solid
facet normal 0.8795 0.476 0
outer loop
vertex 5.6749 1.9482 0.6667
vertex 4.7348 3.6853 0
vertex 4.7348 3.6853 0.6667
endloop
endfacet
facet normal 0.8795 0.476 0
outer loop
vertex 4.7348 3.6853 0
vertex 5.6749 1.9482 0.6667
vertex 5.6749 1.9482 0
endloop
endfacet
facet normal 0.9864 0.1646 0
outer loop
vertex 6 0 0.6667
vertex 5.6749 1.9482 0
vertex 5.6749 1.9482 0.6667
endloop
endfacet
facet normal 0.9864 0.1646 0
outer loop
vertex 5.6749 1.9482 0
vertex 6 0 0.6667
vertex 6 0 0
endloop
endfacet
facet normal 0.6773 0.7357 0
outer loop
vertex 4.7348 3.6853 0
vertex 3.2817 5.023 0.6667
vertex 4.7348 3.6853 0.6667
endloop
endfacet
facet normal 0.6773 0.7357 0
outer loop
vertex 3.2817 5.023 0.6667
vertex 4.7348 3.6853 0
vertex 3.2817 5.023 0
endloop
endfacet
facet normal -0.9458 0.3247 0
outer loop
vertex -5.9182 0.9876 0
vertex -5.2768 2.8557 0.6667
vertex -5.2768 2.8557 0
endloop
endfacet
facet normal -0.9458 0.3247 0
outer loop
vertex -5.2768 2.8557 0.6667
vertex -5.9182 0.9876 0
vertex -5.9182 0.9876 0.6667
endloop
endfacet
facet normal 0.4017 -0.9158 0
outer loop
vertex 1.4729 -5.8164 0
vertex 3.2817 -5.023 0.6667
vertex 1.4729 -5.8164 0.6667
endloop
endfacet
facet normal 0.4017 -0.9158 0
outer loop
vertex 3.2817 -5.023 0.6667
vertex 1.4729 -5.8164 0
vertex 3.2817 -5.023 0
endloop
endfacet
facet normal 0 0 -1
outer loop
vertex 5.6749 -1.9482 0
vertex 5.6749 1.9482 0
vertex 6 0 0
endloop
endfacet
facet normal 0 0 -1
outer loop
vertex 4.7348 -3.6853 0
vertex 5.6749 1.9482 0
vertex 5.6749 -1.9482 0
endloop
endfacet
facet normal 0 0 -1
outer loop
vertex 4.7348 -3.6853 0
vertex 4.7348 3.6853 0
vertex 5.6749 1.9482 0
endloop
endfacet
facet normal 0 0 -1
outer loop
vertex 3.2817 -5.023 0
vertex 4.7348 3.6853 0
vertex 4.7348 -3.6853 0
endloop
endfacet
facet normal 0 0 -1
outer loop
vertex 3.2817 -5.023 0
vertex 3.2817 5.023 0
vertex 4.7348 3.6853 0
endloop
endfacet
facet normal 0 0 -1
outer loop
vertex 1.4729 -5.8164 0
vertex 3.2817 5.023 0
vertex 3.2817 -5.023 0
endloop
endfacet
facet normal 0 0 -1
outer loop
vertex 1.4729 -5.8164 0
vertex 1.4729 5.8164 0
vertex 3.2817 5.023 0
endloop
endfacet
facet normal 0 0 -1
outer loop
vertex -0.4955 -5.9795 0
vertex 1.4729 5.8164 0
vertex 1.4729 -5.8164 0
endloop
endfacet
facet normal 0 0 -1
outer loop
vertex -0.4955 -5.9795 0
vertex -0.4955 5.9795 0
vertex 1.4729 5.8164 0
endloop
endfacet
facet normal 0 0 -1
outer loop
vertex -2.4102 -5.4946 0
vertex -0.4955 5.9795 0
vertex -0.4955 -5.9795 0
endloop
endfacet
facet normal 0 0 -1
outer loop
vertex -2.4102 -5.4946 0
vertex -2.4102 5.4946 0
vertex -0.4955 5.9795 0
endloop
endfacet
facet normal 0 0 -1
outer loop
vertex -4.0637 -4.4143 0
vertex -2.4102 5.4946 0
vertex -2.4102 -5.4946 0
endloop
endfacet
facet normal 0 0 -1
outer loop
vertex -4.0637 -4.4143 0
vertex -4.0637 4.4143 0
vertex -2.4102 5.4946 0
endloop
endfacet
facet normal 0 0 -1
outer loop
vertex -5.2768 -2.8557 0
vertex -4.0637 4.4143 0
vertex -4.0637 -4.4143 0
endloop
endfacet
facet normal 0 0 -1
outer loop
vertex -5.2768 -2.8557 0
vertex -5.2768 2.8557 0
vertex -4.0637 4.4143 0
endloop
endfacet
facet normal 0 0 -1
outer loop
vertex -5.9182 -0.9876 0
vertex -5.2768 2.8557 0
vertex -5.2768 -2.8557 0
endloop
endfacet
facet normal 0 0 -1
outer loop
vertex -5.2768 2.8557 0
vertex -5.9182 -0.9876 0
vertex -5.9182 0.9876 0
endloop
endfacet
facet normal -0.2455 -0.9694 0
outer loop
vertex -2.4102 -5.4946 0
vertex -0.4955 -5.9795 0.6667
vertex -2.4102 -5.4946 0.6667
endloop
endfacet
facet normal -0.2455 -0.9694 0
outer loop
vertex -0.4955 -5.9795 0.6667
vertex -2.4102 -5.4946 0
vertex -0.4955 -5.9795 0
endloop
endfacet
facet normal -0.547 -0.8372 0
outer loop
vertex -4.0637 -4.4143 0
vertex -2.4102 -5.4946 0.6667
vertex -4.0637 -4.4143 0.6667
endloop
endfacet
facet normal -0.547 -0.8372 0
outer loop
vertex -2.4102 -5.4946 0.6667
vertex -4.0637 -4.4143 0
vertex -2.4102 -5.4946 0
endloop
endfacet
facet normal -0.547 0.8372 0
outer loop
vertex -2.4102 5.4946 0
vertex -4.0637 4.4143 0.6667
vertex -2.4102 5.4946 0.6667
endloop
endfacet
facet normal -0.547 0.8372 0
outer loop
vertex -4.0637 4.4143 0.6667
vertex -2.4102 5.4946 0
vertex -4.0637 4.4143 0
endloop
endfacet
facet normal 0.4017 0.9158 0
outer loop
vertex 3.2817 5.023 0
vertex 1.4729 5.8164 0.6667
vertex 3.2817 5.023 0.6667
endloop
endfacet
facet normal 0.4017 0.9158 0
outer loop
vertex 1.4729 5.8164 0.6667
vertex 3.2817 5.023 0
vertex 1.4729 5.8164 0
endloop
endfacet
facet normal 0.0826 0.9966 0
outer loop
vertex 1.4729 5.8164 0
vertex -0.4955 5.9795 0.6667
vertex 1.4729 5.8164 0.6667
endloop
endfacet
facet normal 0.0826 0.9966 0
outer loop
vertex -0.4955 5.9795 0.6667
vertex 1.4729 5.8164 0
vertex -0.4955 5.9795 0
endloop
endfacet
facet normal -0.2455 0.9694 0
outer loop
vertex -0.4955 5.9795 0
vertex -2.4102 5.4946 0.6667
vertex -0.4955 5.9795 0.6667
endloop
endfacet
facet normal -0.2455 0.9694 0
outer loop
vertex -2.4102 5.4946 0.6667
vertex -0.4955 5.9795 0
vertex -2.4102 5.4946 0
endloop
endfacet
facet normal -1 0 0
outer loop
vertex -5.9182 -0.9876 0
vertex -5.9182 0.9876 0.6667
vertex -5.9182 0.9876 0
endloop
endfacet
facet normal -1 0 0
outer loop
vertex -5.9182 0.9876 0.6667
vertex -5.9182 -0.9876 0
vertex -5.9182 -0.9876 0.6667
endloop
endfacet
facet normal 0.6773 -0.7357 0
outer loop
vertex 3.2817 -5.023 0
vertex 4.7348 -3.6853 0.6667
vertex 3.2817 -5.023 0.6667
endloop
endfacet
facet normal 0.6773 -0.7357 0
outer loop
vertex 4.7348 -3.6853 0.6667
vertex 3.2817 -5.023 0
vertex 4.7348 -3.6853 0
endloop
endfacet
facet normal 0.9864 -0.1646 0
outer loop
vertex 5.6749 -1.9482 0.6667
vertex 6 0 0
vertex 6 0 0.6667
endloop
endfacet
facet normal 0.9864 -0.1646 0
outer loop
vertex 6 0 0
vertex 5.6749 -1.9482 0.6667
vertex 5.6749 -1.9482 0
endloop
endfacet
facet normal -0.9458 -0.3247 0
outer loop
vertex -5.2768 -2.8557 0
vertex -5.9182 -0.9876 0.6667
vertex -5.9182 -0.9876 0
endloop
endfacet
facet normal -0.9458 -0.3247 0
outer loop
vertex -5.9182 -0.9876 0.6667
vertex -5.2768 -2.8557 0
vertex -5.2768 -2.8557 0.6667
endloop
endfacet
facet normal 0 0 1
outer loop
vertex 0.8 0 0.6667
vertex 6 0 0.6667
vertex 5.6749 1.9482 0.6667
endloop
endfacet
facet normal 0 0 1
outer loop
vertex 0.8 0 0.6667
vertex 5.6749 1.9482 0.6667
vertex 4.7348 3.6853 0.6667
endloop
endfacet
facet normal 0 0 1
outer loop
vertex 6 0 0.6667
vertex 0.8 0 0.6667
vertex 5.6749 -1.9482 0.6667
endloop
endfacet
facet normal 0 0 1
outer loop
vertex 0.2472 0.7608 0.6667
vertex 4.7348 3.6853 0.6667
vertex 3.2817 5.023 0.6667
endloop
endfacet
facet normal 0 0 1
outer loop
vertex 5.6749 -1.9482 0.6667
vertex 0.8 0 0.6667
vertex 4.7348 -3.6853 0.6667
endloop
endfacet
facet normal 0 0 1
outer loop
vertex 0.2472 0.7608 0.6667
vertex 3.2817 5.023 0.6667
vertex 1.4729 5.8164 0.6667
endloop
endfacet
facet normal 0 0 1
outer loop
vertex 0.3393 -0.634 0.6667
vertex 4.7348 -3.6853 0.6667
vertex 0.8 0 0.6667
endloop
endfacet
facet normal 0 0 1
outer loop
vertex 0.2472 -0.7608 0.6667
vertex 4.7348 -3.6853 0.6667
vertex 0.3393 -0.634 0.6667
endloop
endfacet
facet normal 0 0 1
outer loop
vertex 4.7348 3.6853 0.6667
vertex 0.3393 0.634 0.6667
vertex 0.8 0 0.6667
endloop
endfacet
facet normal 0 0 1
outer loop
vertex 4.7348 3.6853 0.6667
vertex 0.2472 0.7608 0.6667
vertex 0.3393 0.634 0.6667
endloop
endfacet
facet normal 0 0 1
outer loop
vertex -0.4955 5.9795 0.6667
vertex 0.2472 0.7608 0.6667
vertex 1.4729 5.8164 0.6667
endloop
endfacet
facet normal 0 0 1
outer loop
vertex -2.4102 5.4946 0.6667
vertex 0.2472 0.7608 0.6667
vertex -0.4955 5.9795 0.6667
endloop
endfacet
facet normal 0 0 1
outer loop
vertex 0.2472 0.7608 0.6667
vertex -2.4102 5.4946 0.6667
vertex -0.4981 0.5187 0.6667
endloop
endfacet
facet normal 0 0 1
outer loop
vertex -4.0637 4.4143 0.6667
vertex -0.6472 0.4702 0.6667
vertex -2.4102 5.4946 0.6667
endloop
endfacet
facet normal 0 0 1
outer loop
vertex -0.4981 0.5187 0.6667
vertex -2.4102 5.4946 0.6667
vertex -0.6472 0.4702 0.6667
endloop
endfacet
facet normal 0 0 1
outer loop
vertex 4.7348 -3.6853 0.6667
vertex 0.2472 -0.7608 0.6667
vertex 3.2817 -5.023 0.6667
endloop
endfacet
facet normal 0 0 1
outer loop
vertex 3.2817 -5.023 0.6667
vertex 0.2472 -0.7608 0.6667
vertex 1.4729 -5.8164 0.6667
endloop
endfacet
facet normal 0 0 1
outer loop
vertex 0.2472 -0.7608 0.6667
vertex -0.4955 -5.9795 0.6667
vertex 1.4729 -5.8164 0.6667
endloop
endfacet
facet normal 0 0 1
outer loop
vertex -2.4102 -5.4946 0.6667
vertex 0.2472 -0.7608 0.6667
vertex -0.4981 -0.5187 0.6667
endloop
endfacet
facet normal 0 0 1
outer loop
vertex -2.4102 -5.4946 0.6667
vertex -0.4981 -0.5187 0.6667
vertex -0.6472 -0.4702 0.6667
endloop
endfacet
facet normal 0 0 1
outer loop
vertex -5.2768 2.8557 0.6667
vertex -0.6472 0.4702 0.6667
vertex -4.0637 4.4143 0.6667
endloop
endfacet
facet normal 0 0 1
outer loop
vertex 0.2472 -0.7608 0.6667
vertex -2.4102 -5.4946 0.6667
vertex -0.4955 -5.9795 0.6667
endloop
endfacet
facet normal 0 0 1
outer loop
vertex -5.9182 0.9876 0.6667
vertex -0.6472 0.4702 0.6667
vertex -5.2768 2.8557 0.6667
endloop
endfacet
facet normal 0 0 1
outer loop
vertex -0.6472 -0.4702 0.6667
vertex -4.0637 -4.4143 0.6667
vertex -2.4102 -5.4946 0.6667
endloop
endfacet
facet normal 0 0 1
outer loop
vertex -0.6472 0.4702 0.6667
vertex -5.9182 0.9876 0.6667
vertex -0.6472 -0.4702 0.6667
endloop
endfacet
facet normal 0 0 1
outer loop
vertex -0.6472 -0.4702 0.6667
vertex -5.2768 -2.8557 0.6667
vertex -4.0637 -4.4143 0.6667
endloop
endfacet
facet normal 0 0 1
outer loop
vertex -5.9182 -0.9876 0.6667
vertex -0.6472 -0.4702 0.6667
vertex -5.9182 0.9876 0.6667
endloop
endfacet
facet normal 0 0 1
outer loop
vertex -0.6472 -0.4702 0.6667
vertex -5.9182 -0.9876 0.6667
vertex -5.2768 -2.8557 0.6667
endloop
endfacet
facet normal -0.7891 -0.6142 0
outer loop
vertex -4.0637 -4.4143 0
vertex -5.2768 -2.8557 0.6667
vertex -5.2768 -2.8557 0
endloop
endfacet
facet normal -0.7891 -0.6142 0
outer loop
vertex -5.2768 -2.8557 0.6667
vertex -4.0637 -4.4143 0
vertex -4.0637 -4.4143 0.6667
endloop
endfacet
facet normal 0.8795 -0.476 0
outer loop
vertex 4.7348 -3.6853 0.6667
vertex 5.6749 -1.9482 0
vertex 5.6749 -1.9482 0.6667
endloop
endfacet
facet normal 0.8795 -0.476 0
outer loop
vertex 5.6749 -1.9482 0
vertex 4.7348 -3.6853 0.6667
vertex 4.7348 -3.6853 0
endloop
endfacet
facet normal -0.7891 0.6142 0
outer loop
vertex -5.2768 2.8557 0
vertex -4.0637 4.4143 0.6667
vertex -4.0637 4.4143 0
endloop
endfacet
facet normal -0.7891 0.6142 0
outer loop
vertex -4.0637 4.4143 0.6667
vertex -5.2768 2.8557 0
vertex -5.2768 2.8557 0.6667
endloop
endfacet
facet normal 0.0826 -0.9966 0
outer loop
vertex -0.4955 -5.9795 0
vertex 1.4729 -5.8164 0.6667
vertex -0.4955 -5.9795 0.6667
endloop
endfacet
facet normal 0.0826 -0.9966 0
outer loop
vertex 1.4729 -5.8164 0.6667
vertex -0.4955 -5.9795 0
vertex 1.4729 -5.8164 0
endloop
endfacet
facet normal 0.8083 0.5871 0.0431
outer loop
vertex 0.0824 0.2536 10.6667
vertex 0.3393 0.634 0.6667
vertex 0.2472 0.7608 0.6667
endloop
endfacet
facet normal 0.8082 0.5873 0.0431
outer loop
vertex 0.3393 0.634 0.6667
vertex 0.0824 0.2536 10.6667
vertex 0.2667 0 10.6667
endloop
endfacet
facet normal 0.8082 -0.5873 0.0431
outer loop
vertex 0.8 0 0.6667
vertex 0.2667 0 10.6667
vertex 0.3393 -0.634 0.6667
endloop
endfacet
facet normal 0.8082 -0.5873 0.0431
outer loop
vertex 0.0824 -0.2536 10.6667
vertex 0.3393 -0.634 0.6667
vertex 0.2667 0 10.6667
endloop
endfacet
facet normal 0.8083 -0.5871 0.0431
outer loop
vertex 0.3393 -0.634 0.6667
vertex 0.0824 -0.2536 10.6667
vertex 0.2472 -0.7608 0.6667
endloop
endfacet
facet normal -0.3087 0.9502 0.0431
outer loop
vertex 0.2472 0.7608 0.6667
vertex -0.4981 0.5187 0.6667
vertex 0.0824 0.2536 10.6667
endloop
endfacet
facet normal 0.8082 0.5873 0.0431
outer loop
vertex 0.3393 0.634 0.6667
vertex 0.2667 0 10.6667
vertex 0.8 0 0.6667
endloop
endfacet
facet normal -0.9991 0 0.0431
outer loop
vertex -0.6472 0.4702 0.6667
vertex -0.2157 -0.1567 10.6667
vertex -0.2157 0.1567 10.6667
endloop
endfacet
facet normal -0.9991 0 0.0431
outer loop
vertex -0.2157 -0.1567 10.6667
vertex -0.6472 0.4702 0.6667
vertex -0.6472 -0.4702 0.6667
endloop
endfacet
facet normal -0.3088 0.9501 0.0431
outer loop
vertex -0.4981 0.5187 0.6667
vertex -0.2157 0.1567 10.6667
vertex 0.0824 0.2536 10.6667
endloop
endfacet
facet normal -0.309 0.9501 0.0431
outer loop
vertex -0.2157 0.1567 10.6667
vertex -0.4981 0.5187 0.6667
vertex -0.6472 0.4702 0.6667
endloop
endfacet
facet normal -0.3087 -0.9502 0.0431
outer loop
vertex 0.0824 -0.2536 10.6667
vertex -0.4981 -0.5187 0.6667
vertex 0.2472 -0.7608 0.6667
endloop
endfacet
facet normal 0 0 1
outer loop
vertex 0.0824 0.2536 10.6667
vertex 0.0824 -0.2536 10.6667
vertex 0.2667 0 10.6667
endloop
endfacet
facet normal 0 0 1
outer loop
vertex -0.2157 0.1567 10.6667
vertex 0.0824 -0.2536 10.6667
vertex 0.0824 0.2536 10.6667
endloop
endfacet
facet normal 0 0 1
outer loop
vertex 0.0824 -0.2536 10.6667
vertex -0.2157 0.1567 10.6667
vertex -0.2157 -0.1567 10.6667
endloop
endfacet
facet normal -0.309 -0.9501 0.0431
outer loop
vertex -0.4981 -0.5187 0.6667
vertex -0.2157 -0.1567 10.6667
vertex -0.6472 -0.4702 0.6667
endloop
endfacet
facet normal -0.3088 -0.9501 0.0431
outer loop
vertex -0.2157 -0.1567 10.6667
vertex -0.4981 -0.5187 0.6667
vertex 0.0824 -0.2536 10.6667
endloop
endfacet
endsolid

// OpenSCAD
// This is mrbenbritton's cookie cutter script
// http://www.thingiverse.com/thing:28882

inputfile = "caterpillar-contour.dxf";

wallThick = 2;
cutterMinimum = 0.4;
baseHeight = 2;
height = 10;
flangeWidth = 6;

//cube([7,5,1], center=true);

minkowski(){
	outline();
	cylinder(r1 = wallThick/3, r2 = cutterMinimum/3, h = height);
};
//%cube([.5, .5, height*3], true);

flange();

module flange(){
	difference(){
	minkowski(){
	baseShape(baseHeight/3);
	cylinder(r = flangeWidth, h = baseHeight/3);
	}
	translate([0,0,-0.01])baseShape(baseHeight*1.1);
	};
}



module outline(){
	difference(){
	minkowski(){
	baseShape(baseHeight/3);
	cylinder(r = cutterMinimum/3, h = baseHeight/3);
	}
	translate([0,0,-0.01])baseShape(baseHeight*1.1);
	};
};

module baseShape(H){
	linear_extrude(file = inputfile, height=H);
}
